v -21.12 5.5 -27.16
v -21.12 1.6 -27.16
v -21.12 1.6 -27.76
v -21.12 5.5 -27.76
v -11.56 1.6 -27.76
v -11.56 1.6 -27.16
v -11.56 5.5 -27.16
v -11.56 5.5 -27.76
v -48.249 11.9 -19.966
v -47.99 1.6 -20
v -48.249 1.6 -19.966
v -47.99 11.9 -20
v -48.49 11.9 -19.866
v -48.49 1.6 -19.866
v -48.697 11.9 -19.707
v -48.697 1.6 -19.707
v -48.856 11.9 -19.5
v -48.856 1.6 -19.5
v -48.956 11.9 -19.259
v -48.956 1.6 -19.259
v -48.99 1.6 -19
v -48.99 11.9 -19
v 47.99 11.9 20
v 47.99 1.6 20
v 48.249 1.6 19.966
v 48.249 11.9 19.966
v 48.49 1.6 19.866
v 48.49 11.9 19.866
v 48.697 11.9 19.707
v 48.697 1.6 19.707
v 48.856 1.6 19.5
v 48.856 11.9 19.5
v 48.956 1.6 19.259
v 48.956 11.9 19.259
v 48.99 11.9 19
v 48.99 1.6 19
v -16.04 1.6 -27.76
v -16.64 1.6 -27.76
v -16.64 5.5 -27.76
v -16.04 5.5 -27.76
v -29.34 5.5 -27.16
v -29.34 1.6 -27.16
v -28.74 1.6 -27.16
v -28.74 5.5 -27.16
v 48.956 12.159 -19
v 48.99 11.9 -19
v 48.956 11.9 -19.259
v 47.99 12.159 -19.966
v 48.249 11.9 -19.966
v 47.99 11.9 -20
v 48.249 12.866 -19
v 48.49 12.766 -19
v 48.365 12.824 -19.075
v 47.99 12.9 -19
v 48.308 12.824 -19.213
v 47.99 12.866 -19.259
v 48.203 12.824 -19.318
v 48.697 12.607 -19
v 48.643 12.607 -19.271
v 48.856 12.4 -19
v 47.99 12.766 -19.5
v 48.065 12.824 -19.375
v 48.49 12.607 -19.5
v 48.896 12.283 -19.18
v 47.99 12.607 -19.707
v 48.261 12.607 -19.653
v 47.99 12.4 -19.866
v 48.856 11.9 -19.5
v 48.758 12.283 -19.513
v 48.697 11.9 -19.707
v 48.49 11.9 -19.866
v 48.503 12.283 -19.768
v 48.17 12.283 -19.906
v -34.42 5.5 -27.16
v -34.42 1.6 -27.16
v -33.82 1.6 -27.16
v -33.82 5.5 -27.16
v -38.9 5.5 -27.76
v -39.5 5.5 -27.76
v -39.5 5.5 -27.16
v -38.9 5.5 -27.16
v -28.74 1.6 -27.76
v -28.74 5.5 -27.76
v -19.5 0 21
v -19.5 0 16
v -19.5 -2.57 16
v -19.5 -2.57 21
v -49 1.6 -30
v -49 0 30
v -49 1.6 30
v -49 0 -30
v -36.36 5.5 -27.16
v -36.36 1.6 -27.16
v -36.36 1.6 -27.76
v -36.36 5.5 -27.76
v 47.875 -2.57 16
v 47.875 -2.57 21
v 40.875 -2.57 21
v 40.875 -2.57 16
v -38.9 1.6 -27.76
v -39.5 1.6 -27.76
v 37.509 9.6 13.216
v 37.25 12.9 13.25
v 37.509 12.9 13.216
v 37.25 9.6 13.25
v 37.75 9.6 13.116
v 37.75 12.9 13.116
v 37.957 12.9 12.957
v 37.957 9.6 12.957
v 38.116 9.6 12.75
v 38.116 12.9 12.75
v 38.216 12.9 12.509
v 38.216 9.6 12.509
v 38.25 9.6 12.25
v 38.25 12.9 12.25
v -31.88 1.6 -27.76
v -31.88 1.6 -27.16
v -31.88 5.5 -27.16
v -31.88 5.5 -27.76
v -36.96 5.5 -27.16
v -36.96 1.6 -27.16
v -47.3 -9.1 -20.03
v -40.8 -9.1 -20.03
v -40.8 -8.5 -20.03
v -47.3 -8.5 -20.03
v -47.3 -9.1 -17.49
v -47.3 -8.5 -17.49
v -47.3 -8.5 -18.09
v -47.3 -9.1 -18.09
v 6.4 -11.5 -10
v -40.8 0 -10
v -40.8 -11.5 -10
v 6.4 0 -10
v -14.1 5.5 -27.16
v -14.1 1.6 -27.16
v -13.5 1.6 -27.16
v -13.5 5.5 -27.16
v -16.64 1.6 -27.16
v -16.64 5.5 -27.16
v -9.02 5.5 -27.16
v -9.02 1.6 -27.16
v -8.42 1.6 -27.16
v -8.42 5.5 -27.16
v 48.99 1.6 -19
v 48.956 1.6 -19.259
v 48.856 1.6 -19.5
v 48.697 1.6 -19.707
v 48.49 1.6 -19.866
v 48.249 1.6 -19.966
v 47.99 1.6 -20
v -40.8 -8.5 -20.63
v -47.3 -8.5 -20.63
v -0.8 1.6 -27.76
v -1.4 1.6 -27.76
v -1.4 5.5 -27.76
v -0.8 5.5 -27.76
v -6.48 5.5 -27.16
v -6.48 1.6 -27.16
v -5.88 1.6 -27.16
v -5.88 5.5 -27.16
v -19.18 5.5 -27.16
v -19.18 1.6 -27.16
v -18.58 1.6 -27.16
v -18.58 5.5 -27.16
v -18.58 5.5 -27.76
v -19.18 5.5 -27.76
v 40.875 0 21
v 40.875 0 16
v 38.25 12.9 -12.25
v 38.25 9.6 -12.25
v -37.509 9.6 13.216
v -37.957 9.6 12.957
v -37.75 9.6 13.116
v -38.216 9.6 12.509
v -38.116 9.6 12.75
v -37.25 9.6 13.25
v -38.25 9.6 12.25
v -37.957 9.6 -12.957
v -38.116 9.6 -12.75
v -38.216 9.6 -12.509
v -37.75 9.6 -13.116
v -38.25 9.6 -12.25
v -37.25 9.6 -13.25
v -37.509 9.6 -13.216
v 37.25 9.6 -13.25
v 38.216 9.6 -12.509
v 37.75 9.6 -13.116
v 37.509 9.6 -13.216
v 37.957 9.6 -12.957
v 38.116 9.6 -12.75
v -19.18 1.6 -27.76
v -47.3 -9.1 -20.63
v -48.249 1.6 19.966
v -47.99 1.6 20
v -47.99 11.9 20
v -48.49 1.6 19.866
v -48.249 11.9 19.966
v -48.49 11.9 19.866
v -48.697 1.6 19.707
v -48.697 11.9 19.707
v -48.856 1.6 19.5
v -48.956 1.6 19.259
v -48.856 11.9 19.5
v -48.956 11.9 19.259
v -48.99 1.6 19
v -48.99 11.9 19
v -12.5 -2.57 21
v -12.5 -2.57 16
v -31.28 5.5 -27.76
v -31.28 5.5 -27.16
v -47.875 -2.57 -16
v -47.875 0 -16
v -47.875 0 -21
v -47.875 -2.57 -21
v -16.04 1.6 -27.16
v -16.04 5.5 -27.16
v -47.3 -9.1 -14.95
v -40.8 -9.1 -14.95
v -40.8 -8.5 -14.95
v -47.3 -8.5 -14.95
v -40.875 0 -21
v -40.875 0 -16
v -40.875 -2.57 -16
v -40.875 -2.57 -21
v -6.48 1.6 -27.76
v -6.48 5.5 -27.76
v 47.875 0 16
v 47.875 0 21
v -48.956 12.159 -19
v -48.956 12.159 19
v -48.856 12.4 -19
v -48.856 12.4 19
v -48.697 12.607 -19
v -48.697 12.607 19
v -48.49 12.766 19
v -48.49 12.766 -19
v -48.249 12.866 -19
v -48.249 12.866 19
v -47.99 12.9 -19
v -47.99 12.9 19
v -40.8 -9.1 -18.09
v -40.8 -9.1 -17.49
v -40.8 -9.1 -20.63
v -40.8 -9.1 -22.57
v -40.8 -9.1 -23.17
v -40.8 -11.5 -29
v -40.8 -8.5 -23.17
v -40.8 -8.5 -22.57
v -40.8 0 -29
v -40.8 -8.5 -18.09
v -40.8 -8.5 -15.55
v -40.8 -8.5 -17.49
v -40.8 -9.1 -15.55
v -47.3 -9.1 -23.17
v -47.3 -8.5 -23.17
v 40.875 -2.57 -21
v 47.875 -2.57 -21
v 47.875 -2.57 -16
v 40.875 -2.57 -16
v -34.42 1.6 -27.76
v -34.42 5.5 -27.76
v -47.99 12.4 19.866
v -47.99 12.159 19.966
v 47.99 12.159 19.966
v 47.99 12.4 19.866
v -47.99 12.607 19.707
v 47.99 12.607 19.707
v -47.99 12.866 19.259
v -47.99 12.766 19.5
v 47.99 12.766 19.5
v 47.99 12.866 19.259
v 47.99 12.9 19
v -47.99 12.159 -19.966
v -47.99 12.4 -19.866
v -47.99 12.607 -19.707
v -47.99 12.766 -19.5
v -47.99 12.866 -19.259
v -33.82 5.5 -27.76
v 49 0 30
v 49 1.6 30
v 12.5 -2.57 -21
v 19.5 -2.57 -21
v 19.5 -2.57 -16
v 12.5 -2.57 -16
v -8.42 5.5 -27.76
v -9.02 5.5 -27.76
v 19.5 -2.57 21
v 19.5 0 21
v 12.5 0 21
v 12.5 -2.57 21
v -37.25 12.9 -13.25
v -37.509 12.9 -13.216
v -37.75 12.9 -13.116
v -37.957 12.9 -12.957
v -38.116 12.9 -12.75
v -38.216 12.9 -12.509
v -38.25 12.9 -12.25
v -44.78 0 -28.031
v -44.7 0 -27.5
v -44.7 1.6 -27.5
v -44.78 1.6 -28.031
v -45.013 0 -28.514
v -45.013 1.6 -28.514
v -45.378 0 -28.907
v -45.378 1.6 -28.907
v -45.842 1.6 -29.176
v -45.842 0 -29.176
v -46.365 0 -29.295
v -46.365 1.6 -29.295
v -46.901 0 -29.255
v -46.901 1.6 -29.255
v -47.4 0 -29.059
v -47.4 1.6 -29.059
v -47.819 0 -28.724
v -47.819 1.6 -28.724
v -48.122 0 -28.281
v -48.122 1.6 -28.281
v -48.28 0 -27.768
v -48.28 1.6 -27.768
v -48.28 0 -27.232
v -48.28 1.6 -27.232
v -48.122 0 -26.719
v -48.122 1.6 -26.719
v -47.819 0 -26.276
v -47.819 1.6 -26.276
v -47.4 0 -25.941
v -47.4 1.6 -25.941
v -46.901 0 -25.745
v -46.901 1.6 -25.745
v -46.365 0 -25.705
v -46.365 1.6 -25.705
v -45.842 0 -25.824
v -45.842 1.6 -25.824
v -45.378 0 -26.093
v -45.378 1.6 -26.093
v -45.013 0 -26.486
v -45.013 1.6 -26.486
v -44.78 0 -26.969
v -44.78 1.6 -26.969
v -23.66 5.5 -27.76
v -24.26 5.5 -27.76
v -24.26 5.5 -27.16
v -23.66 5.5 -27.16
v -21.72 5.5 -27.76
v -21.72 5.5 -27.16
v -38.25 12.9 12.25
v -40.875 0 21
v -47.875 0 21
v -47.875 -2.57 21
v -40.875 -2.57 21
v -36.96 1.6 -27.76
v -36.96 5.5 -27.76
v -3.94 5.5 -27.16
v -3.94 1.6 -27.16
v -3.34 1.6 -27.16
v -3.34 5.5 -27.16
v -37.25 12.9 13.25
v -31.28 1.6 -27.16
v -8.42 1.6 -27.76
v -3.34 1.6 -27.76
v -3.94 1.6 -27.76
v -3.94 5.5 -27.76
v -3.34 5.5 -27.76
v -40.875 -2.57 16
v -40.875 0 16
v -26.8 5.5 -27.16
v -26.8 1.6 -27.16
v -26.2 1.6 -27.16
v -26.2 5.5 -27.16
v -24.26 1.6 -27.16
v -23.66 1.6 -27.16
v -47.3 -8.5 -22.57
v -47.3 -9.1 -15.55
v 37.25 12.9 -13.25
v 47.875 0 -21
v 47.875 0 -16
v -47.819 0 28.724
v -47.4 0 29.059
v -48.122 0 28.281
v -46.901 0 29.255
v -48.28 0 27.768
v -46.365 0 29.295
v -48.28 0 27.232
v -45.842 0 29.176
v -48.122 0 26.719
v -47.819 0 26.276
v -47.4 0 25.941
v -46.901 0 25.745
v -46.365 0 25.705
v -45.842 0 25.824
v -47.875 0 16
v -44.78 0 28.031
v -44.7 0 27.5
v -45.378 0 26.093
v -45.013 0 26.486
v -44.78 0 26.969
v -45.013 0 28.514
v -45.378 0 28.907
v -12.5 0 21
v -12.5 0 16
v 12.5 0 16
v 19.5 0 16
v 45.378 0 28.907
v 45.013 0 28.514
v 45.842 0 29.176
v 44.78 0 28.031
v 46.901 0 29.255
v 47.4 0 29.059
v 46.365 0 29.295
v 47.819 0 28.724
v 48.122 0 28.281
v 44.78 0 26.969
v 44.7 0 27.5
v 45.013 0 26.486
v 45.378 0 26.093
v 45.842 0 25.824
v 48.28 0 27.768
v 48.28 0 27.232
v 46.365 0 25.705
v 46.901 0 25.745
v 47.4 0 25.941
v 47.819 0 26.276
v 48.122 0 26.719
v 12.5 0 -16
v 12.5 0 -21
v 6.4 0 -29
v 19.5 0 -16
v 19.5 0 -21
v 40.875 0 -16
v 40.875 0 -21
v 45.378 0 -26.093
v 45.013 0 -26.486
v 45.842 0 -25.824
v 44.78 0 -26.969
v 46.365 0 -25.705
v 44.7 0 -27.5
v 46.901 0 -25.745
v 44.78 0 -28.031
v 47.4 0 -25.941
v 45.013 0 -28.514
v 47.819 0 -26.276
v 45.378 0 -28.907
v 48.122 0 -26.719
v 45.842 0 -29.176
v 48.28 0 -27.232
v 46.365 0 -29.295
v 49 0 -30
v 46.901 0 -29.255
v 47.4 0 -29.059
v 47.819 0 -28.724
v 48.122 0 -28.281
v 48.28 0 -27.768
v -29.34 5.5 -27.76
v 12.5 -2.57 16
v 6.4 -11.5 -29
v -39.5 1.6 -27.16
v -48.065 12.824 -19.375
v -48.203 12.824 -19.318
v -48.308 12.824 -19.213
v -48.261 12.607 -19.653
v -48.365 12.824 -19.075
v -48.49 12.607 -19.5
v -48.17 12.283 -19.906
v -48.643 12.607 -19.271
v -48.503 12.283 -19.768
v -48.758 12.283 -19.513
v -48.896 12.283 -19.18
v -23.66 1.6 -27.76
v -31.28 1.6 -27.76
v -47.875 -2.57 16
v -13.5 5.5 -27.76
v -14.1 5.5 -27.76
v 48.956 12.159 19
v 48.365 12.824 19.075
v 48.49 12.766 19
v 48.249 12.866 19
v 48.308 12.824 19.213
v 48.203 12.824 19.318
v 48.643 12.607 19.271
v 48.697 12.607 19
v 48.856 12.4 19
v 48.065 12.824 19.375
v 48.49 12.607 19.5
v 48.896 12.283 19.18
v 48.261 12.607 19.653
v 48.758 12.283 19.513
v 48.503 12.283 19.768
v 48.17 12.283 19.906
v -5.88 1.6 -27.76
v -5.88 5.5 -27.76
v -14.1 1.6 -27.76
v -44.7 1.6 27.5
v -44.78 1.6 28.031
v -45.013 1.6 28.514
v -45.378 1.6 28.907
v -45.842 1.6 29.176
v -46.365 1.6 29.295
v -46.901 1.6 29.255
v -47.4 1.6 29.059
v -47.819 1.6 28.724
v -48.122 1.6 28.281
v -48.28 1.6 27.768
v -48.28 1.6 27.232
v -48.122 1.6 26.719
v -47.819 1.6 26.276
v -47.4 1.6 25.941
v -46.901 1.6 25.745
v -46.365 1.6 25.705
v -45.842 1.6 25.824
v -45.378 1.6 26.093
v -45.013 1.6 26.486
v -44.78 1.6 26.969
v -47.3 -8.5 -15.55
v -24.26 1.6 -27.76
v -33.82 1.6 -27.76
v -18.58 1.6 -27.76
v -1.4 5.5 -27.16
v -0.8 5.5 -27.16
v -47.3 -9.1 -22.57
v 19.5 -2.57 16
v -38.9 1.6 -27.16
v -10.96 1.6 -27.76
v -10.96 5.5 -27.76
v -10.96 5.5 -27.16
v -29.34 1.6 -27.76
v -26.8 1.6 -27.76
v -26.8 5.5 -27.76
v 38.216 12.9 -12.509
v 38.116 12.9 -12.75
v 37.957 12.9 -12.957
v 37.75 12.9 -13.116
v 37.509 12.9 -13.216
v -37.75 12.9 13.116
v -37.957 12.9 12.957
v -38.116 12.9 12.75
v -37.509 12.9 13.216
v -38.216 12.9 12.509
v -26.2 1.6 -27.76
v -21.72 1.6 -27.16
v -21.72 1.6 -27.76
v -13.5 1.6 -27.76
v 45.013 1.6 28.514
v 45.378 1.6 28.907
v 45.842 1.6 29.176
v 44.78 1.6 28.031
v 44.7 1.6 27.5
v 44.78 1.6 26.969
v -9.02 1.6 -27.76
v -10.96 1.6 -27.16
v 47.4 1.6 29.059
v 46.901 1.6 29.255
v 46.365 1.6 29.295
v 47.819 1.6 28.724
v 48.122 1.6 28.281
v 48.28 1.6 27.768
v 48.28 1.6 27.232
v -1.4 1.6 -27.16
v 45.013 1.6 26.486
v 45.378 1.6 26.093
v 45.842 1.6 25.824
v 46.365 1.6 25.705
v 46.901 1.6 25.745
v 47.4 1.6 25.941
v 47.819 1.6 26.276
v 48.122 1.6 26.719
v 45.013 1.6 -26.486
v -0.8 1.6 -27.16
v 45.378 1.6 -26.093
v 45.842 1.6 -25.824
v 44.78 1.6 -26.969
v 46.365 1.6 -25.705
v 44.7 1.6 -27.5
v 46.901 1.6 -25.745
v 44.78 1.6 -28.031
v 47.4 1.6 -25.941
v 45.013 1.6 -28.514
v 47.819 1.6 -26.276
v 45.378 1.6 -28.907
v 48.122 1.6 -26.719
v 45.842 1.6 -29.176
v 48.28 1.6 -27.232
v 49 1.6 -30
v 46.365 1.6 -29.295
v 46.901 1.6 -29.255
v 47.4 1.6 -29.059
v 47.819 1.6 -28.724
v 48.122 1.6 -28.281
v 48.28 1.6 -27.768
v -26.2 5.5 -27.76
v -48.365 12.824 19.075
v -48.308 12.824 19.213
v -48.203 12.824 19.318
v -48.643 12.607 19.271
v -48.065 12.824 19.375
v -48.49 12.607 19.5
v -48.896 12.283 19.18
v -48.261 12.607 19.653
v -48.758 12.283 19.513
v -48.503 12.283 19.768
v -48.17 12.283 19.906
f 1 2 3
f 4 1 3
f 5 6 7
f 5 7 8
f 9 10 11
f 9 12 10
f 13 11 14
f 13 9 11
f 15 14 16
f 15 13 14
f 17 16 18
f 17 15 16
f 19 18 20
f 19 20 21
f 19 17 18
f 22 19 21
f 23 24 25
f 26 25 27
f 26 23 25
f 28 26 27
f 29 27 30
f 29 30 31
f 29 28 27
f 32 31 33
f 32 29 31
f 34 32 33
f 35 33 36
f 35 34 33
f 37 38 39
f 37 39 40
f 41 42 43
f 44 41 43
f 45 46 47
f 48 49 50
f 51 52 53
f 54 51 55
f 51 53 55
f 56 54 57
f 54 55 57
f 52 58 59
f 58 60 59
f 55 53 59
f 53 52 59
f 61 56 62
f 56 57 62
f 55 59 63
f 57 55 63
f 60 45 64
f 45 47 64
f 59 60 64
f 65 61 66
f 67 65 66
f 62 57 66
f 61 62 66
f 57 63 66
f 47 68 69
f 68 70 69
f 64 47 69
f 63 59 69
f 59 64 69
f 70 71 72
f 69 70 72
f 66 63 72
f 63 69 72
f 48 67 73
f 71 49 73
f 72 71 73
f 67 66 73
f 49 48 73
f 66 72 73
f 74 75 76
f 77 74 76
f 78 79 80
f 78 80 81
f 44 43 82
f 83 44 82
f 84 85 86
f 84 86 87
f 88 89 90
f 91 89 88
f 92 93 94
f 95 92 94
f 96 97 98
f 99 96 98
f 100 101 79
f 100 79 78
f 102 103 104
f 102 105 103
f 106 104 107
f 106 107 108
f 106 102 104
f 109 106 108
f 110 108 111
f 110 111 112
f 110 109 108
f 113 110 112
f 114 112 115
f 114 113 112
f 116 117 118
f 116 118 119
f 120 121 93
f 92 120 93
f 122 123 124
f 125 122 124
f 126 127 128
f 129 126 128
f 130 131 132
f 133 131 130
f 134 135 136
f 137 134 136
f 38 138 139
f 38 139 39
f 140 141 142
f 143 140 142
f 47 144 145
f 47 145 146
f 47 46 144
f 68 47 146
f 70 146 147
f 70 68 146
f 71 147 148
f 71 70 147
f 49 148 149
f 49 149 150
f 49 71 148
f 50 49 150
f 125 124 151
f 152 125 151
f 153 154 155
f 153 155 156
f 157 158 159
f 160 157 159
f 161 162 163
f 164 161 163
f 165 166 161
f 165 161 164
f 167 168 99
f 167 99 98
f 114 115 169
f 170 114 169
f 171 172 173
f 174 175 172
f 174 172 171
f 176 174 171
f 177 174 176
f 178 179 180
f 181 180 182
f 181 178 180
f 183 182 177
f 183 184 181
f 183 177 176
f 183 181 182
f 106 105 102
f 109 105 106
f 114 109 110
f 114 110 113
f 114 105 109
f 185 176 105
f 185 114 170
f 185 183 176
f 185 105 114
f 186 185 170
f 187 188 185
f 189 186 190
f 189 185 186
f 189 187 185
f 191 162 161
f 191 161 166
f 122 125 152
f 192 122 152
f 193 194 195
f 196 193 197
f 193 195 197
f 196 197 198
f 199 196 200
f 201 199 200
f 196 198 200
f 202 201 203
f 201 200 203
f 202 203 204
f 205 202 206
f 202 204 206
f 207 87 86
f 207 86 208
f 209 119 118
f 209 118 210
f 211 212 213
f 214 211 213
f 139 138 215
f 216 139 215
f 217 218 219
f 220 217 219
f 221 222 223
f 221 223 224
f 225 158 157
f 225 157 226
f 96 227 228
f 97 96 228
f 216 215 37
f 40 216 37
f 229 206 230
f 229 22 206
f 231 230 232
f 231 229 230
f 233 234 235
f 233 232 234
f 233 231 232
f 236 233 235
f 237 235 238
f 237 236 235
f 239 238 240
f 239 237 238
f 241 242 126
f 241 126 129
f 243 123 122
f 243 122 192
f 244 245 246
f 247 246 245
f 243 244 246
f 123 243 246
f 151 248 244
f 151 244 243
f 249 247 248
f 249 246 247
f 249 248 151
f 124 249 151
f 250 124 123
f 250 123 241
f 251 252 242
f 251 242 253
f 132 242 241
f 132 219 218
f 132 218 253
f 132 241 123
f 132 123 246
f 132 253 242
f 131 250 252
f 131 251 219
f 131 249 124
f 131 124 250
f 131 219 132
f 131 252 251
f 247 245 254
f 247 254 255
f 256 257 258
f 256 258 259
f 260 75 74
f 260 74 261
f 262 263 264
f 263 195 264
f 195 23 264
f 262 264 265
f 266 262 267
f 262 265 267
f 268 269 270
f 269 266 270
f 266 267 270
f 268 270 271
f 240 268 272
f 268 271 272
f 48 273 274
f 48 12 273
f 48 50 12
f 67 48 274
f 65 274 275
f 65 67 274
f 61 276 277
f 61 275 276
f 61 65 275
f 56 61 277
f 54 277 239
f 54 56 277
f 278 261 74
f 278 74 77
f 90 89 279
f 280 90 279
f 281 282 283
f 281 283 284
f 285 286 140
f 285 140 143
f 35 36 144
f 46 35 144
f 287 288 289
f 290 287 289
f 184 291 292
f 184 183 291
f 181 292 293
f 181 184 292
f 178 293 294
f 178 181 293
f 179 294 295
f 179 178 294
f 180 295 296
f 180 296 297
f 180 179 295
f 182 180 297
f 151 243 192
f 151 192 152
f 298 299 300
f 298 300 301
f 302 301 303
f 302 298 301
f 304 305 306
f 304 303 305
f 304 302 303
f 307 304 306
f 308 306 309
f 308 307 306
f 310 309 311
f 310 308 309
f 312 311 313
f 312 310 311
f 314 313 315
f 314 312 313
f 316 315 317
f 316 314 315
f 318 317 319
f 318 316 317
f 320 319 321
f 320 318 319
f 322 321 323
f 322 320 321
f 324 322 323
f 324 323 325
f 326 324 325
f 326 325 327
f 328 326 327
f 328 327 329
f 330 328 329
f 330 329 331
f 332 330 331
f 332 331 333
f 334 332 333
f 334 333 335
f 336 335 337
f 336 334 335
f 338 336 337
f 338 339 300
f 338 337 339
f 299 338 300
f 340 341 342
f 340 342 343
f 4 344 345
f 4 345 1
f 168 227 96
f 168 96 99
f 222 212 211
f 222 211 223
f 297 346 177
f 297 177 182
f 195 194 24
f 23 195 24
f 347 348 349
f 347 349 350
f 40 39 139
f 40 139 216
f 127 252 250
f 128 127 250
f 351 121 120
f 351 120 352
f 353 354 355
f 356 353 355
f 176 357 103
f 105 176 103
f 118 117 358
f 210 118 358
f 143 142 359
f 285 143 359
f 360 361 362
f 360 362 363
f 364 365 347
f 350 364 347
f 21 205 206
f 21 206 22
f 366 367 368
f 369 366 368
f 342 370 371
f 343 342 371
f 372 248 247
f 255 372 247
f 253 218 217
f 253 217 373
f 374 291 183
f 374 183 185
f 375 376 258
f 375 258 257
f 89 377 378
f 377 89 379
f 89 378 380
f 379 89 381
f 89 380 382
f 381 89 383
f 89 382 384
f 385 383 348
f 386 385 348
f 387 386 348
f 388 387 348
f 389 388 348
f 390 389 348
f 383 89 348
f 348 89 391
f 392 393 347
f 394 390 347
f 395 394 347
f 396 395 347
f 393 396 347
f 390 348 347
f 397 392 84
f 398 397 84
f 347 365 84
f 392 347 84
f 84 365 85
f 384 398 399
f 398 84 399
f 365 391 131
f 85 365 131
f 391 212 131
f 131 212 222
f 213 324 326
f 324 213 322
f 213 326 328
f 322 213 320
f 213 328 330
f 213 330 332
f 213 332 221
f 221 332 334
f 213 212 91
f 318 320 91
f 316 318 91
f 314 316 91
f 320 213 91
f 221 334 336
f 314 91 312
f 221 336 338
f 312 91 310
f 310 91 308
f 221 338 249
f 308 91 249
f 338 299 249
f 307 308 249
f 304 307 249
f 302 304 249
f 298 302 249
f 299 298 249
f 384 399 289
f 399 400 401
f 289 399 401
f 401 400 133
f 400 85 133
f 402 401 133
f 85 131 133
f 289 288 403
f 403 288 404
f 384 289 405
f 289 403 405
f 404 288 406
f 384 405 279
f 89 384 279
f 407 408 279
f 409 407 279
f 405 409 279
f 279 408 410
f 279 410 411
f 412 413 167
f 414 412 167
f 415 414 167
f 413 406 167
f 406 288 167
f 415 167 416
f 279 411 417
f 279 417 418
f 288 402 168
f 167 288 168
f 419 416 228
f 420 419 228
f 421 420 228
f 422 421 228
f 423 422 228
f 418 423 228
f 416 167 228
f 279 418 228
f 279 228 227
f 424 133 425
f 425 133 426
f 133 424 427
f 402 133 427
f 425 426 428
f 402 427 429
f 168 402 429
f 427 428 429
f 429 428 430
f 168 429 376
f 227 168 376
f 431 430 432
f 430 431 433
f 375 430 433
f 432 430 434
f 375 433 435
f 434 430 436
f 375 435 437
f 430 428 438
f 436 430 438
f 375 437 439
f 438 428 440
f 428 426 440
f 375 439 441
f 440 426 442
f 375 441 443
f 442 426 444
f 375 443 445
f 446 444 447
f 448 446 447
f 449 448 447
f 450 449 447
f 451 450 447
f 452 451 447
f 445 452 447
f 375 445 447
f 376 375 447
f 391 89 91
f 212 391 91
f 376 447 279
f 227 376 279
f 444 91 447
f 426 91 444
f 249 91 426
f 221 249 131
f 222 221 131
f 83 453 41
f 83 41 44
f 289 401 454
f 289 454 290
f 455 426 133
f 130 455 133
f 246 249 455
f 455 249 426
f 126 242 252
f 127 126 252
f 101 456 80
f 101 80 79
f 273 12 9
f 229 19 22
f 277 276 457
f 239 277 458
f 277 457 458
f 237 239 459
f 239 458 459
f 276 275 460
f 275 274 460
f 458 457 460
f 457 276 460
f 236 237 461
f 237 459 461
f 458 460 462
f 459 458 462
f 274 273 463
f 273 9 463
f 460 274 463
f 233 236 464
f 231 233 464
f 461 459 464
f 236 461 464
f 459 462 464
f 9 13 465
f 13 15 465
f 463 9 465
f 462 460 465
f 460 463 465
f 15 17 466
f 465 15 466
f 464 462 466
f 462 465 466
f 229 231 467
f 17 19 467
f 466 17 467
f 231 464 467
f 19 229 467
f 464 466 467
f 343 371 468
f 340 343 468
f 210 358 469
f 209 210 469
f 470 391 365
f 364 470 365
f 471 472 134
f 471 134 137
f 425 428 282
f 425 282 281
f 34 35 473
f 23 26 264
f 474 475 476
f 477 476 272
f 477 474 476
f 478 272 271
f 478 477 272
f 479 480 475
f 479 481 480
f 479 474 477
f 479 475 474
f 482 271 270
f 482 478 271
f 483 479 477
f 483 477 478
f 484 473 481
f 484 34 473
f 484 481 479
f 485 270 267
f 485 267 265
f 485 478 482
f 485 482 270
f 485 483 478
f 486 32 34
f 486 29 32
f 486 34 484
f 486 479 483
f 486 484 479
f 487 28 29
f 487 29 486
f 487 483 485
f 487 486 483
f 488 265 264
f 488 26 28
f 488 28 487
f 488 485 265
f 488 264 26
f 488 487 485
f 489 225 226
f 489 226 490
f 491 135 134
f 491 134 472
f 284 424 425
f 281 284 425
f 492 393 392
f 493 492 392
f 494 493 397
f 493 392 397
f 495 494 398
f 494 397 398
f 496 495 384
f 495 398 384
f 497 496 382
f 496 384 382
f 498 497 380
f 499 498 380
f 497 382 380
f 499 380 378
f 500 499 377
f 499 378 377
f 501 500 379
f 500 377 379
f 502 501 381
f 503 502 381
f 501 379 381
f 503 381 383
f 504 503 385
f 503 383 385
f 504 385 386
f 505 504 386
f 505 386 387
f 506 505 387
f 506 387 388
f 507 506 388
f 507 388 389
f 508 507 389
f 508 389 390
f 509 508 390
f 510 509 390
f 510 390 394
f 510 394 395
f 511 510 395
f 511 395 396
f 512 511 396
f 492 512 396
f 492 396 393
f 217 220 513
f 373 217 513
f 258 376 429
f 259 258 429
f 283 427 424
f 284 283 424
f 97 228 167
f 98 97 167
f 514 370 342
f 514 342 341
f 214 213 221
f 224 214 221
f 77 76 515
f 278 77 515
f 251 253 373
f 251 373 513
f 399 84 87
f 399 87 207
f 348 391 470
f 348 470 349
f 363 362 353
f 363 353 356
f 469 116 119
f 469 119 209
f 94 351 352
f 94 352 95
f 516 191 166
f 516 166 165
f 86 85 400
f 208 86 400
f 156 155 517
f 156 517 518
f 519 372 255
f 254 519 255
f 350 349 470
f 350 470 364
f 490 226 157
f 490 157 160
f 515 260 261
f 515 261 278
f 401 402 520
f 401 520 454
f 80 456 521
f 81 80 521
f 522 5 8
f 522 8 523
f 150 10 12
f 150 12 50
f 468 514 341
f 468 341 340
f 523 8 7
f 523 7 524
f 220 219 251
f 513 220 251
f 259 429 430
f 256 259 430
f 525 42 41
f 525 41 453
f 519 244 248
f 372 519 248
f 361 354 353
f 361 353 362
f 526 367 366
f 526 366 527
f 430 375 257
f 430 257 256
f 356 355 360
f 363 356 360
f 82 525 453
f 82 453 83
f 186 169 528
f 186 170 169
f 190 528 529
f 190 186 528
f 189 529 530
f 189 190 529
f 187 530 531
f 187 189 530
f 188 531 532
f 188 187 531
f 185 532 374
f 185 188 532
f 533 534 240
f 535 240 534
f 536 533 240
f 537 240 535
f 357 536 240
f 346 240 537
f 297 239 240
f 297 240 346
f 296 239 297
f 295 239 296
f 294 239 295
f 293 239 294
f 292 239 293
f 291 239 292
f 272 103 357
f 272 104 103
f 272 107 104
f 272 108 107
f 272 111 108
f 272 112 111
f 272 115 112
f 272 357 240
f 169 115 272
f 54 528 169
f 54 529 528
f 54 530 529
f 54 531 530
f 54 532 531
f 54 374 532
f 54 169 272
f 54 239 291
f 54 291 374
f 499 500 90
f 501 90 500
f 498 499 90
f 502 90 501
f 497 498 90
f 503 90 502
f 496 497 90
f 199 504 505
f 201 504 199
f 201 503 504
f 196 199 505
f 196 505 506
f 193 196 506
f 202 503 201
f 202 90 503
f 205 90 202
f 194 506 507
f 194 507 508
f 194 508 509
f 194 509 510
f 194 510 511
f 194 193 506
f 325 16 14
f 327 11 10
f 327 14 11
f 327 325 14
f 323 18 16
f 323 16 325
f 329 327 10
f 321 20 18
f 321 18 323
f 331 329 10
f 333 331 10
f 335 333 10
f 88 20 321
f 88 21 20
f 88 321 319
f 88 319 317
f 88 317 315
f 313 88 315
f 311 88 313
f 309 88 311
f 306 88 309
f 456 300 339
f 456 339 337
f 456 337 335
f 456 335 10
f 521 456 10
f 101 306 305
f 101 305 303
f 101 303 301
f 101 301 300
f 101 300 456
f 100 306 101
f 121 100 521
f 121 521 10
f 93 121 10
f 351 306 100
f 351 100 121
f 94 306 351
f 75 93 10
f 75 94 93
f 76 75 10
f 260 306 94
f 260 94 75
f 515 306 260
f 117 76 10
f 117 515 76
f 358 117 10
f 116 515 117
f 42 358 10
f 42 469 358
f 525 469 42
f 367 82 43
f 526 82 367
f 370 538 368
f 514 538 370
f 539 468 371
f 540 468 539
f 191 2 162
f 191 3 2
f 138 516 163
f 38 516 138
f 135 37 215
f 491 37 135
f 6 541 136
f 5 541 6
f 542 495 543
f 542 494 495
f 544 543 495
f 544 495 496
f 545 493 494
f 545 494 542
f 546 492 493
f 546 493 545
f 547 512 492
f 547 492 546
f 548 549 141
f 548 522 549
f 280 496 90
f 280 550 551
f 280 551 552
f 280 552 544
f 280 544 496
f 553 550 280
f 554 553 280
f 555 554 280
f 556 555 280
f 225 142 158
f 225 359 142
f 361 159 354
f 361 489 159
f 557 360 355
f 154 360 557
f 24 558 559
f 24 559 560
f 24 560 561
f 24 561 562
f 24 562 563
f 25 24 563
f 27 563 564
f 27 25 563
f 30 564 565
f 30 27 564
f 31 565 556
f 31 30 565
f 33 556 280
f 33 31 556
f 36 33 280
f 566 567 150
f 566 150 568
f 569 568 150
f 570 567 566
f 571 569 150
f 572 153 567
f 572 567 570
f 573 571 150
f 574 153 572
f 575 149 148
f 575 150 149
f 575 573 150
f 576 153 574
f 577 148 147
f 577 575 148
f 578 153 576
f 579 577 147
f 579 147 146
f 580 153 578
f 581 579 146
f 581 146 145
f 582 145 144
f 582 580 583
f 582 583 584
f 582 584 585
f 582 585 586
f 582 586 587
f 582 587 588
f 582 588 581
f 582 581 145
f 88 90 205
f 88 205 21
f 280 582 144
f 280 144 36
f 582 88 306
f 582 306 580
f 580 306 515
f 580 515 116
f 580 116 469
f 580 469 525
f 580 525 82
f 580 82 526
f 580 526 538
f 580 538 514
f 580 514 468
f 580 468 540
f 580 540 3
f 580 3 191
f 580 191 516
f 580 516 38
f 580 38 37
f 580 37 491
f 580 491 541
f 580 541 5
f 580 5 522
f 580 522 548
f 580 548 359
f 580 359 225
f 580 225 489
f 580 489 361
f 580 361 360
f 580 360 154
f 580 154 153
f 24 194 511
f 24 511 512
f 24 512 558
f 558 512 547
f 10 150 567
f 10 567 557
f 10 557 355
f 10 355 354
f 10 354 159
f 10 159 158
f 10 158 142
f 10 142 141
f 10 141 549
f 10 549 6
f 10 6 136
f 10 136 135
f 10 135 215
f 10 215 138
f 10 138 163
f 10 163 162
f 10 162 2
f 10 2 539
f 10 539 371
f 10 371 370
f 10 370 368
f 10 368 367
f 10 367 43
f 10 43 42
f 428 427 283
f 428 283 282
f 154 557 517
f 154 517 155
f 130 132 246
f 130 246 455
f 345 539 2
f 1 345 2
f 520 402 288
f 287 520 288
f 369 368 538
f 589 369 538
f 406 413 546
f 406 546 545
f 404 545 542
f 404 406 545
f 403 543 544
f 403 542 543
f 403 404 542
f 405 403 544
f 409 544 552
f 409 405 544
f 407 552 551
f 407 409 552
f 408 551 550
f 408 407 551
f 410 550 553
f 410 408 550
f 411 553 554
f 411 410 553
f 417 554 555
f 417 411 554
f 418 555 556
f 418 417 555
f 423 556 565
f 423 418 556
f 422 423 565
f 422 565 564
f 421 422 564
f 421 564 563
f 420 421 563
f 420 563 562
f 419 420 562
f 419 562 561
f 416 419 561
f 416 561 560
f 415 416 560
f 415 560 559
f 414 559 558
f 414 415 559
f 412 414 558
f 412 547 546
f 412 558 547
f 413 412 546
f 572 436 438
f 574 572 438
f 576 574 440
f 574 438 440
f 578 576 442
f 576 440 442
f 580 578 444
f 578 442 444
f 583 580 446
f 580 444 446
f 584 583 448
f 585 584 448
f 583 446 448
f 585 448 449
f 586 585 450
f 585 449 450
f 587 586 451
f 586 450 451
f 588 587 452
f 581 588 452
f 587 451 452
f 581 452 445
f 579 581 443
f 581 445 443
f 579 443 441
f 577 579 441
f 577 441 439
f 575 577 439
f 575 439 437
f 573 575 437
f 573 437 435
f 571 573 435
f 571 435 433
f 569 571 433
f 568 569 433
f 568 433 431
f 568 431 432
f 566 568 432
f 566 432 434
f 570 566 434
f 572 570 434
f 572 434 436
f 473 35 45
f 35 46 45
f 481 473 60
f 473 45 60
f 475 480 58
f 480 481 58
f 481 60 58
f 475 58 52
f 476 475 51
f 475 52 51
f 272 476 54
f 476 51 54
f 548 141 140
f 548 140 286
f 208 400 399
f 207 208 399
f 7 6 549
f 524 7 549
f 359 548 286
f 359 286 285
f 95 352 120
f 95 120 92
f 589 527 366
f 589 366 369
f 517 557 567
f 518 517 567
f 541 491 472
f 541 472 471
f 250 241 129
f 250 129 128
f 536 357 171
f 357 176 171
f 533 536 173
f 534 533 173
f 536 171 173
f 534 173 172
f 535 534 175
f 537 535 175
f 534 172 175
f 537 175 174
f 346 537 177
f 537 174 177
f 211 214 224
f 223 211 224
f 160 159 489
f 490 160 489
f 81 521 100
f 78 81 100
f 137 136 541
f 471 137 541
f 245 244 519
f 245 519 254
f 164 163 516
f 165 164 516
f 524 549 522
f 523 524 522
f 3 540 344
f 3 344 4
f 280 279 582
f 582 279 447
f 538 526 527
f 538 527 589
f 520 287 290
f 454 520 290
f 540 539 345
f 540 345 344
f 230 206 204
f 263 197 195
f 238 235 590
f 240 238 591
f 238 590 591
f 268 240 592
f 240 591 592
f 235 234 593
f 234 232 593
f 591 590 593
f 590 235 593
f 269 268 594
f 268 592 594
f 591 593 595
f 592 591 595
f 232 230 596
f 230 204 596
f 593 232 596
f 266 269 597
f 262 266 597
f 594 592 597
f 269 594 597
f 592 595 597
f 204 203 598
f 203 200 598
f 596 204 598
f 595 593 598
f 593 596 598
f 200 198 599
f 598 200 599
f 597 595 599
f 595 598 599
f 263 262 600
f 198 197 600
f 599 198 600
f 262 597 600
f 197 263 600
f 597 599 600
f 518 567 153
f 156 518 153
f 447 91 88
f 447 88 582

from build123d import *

# Parameters (mm, degrees)
SKETCH1_W               = 98
SKETCH1_H               = 60
BOSS_EXTRUDE1_DEPTH     = 1.6
CUT_EXTRUDE1_START      = -2.6
SKETCH2_R               = 1.8
CUT_EXTRUDE1_DEPTH      = 3.6
SKETCH5_W               = 7
SKETCH5_H               = 5
BOSS_EXTRUDE3_DEPTH     = 2.57
MIRROR2_START           = -2.6
MIRROR2_COPY_1_SKETCH_R = 1.8
MIRROR2_COPY_1_DEPTH    = 3.6
MIRROR2_COPY_2_SKETCH_W = 7
MIRROR2_COPY_2_SKETCH_H = 5
MIRROR2_COPY_2_DEPTH    = 2.57
SKETCH3_W               = 97.98
SKETCH3_H               = 40
BOSS_EXTRUDE2_DEPTH     = 11.3
SKETCH4_W               = 76.5
SKETCH4_H               = 26.5
CUT_EXTRUDE2_DEPTH      = 3.3
FILLET1_R               = 1
SKETCH6_W               = 47.2
SKETCH6_H               = 19
BOSS_EXTRUDE4_DEPTH     = 11.5
SKETCH7_W               = 0.6
SKETCH7_H               = 0.6
BOSS_EXTRUDE5_DEPTH     = 6.5
SKETCH9_W               = 0.6
SKETCH9_H               = 0.6
BOSS_EXTRUDE7_DEPTH     = 3.9
LPATTERN1_COUNT         = 16
LPATTERN1_PITCH         = 2.54


with BuildPart() as part:
    # Sketch1 → Boss-Extrude1 (new body)
    with BuildSketch(Plane(origin=(0, 0, 0), x_dir=(1, 0, 0), z_dir=(0, 1, 0))):
        Rectangle(SKETCH1_W, SKETCH1_H)
    extrude(amount=BOSS_EXTRUDE1_DEPTH)

    # Sketch2 → Cut-Extrude1 (cut)
    with BuildSketch(Plane(origin=(0, 1.6, 0), x_dir=(1, 0, 0), z_dir=(0, 1, 0)).offset(CUT_EXTRUDE1_START)):
        with Locations((-46.5, 27.5)):
            Circle(SKETCH2_R)
    cut_extrude1 = extrude(amount=CUT_EXTRUDE1_DEPTH, mode=Mode.SUBTRACT)

    # Sketch5 → Boss-Extrude3 (add)
    with BuildSketch(Plane.XZ):
        with Locations((-44.375, 18.5)):
            Rectangle(SKETCH5_W, SKETCH5_H)
        with Locations((-16, 18.5)):
            Rectangle(SKETCH5_W, SKETCH5_H)
    boss_extrude3 = extrude(amount=BOSS_EXTRUDE3_DEPTH)

    # Mirror1: Cut-Extrude1, Boss-Extrude3 across plane
    add(cut_extrude1.mirror(Plane.XY), mode=Mode.SUBTRACT)
    add(boss_extrude3.mirror(Plane.XY))

    # Mirror2: Cut-Extrude1, Boss-Extrude3 across plane
    add(cut_extrude1.mirror(Plane(origin=(0, 0, 0), x_dir=(0, 0, 1), z_dir=(1, 0, 0))), mode=Mode.SUBTRACT)
    add(boss_extrude3.mirror(Plane(origin=(0, 0, 0), x_dir=(0, 0, 1), z_dir=(1, 0, 0))))

    # Mirror2 copy 1 sketch → Mirror2 copy 1 (cut)
    with BuildSketch(Plane(origin=(0, 1.6, 0), x_dir=(-1, 0, 0), z_dir=(0, 1, 0)).offset(MIRROR2_START)):
        with Locations((-46.5, 27.5)):
            Circle(MIRROR2_COPY_1_SKETCH_R)
    extrude(amount=MIRROR2_COPY_1_DEPTH, mode=Mode.SUBTRACT)

    # Mirror2 copy 2 sketch → Mirror2 copy 2 (add)
    with BuildSketch(Plane(origin=(0, 0, 0), x_dir=(-1, 0, 0), z_dir=(0, -1, 0))):
        with Locations((-44.375, 18.5)):
            Rectangle(MIRROR2_COPY_2_SKETCH_W, MIRROR2_COPY_2_SKETCH_H)
        with Locations((-16, 18.5)):
            Rectangle(MIRROR2_COPY_2_SKETCH_W, MIRROR2_COPY_2_SKETCH_H)
    extrude(amount=MIRROR2_COPY_2_DEPTH)

    # Sketch3 → Boss-Extrude2 (add)
    with BuildSketch(Plane(origin=(0, 1.6, 0), x_dir=(1, 0, 0), z_dir=(0, 1, 0))):
        Rectangle(SKETCH3_W, SKETCH3_H)
    extrude(amount=BOSS_EXTRUDE2_DEPTH)

    # Sketch4 → Cut-Extrude2 (cut)
    with BuildSketch(Plane(origin=(0, 12.9, 0), x_dir=(1, 0, 0), z_dir=(0, 1, 0))):
        Rectangle(SKETCH4_W, SKETCH4_H)
    extrude(amount=-CUT_EXTRUDE2_DEPTH, mode=Mode.SUBTRACT)

    # Fillet1
    fillet1_edges = [part.edges().sort_by_distance(p)[0] for p in [
        (48.99, 7.25, 20),
        (48.99, 7.25, -20),
        (-48.99, 7.25, -20),
        (-48.99, 7.25, 20),
        (48.99, 12.9, 0),
        (0, 12.9, -20),
        (-48.99, 12.9, 0),
        (0, 12.9, 20),
        (38.25, 11.25, -13.25),
        (38.25, 11.25, 13.25),
        (-38.25, 11.25, 13.25),
        (-38.25, 11.25, -13.25),
    ]]
    fillet(fillet1_edges, radius=FILLET1_R)

    # Sketch6 → Boss-Extrude4 (add)
    with BuildSketch(Plane.XZ):
        with Locations((-17.2, -19.5)):
            Rectangle(SKETCH6_W, SKETCH6_H)
    extrude(amount=BOSS_EXTRUDE4_DEPTH)

    # Sketch7 → Boss-Extrude5 (add)
    with BuildSketch(Plane(origin=(-40.8, 0, 0), x_dir=(0, 0, -1), z_dir=(1, 0, 0))):
        with Locations((15.25, -8.8)):
            Rectangle(SKETCH7_W, SKETCH7_H)
        with Locations((17.79, -8.8)):
            Rectangle(SKETCH7_W, SKETCH7_H)
        with Locations((20.33, -8.8)):
            Rectangle(SKETCH7_W, SKETCH7_H)
        with Locations((22.87, -8.8)):
            Rectangle(SKETCH7_W, SKETCH7_H)
    extrude(amount=-BOSS_EXTRUDE5_DEPTH)

    # Sketch9 → Boss-Extrude7 (add)
    with BuildSketch(Plane(origin=(0, 1.6, 0), x_dir=(1, 0, 0), z_dir=(0, 1, 0))):
        with Locations((-39.2, 27.46)):
            Rectangle(SKETCH9_W, SKETCH9_H)
    boss_extrude7 = extrude(amount=BOSS_EXTRUDE7_DEPTH)

    # LPattern1: Boss-Extrude7 ×16
    with Locations(*[(i * LPATTERN1_PITCH, 0, 0) for i in range(1, LPATTERN1_COUNT)]):
        add(boss_extrude7)


solid = part.part
